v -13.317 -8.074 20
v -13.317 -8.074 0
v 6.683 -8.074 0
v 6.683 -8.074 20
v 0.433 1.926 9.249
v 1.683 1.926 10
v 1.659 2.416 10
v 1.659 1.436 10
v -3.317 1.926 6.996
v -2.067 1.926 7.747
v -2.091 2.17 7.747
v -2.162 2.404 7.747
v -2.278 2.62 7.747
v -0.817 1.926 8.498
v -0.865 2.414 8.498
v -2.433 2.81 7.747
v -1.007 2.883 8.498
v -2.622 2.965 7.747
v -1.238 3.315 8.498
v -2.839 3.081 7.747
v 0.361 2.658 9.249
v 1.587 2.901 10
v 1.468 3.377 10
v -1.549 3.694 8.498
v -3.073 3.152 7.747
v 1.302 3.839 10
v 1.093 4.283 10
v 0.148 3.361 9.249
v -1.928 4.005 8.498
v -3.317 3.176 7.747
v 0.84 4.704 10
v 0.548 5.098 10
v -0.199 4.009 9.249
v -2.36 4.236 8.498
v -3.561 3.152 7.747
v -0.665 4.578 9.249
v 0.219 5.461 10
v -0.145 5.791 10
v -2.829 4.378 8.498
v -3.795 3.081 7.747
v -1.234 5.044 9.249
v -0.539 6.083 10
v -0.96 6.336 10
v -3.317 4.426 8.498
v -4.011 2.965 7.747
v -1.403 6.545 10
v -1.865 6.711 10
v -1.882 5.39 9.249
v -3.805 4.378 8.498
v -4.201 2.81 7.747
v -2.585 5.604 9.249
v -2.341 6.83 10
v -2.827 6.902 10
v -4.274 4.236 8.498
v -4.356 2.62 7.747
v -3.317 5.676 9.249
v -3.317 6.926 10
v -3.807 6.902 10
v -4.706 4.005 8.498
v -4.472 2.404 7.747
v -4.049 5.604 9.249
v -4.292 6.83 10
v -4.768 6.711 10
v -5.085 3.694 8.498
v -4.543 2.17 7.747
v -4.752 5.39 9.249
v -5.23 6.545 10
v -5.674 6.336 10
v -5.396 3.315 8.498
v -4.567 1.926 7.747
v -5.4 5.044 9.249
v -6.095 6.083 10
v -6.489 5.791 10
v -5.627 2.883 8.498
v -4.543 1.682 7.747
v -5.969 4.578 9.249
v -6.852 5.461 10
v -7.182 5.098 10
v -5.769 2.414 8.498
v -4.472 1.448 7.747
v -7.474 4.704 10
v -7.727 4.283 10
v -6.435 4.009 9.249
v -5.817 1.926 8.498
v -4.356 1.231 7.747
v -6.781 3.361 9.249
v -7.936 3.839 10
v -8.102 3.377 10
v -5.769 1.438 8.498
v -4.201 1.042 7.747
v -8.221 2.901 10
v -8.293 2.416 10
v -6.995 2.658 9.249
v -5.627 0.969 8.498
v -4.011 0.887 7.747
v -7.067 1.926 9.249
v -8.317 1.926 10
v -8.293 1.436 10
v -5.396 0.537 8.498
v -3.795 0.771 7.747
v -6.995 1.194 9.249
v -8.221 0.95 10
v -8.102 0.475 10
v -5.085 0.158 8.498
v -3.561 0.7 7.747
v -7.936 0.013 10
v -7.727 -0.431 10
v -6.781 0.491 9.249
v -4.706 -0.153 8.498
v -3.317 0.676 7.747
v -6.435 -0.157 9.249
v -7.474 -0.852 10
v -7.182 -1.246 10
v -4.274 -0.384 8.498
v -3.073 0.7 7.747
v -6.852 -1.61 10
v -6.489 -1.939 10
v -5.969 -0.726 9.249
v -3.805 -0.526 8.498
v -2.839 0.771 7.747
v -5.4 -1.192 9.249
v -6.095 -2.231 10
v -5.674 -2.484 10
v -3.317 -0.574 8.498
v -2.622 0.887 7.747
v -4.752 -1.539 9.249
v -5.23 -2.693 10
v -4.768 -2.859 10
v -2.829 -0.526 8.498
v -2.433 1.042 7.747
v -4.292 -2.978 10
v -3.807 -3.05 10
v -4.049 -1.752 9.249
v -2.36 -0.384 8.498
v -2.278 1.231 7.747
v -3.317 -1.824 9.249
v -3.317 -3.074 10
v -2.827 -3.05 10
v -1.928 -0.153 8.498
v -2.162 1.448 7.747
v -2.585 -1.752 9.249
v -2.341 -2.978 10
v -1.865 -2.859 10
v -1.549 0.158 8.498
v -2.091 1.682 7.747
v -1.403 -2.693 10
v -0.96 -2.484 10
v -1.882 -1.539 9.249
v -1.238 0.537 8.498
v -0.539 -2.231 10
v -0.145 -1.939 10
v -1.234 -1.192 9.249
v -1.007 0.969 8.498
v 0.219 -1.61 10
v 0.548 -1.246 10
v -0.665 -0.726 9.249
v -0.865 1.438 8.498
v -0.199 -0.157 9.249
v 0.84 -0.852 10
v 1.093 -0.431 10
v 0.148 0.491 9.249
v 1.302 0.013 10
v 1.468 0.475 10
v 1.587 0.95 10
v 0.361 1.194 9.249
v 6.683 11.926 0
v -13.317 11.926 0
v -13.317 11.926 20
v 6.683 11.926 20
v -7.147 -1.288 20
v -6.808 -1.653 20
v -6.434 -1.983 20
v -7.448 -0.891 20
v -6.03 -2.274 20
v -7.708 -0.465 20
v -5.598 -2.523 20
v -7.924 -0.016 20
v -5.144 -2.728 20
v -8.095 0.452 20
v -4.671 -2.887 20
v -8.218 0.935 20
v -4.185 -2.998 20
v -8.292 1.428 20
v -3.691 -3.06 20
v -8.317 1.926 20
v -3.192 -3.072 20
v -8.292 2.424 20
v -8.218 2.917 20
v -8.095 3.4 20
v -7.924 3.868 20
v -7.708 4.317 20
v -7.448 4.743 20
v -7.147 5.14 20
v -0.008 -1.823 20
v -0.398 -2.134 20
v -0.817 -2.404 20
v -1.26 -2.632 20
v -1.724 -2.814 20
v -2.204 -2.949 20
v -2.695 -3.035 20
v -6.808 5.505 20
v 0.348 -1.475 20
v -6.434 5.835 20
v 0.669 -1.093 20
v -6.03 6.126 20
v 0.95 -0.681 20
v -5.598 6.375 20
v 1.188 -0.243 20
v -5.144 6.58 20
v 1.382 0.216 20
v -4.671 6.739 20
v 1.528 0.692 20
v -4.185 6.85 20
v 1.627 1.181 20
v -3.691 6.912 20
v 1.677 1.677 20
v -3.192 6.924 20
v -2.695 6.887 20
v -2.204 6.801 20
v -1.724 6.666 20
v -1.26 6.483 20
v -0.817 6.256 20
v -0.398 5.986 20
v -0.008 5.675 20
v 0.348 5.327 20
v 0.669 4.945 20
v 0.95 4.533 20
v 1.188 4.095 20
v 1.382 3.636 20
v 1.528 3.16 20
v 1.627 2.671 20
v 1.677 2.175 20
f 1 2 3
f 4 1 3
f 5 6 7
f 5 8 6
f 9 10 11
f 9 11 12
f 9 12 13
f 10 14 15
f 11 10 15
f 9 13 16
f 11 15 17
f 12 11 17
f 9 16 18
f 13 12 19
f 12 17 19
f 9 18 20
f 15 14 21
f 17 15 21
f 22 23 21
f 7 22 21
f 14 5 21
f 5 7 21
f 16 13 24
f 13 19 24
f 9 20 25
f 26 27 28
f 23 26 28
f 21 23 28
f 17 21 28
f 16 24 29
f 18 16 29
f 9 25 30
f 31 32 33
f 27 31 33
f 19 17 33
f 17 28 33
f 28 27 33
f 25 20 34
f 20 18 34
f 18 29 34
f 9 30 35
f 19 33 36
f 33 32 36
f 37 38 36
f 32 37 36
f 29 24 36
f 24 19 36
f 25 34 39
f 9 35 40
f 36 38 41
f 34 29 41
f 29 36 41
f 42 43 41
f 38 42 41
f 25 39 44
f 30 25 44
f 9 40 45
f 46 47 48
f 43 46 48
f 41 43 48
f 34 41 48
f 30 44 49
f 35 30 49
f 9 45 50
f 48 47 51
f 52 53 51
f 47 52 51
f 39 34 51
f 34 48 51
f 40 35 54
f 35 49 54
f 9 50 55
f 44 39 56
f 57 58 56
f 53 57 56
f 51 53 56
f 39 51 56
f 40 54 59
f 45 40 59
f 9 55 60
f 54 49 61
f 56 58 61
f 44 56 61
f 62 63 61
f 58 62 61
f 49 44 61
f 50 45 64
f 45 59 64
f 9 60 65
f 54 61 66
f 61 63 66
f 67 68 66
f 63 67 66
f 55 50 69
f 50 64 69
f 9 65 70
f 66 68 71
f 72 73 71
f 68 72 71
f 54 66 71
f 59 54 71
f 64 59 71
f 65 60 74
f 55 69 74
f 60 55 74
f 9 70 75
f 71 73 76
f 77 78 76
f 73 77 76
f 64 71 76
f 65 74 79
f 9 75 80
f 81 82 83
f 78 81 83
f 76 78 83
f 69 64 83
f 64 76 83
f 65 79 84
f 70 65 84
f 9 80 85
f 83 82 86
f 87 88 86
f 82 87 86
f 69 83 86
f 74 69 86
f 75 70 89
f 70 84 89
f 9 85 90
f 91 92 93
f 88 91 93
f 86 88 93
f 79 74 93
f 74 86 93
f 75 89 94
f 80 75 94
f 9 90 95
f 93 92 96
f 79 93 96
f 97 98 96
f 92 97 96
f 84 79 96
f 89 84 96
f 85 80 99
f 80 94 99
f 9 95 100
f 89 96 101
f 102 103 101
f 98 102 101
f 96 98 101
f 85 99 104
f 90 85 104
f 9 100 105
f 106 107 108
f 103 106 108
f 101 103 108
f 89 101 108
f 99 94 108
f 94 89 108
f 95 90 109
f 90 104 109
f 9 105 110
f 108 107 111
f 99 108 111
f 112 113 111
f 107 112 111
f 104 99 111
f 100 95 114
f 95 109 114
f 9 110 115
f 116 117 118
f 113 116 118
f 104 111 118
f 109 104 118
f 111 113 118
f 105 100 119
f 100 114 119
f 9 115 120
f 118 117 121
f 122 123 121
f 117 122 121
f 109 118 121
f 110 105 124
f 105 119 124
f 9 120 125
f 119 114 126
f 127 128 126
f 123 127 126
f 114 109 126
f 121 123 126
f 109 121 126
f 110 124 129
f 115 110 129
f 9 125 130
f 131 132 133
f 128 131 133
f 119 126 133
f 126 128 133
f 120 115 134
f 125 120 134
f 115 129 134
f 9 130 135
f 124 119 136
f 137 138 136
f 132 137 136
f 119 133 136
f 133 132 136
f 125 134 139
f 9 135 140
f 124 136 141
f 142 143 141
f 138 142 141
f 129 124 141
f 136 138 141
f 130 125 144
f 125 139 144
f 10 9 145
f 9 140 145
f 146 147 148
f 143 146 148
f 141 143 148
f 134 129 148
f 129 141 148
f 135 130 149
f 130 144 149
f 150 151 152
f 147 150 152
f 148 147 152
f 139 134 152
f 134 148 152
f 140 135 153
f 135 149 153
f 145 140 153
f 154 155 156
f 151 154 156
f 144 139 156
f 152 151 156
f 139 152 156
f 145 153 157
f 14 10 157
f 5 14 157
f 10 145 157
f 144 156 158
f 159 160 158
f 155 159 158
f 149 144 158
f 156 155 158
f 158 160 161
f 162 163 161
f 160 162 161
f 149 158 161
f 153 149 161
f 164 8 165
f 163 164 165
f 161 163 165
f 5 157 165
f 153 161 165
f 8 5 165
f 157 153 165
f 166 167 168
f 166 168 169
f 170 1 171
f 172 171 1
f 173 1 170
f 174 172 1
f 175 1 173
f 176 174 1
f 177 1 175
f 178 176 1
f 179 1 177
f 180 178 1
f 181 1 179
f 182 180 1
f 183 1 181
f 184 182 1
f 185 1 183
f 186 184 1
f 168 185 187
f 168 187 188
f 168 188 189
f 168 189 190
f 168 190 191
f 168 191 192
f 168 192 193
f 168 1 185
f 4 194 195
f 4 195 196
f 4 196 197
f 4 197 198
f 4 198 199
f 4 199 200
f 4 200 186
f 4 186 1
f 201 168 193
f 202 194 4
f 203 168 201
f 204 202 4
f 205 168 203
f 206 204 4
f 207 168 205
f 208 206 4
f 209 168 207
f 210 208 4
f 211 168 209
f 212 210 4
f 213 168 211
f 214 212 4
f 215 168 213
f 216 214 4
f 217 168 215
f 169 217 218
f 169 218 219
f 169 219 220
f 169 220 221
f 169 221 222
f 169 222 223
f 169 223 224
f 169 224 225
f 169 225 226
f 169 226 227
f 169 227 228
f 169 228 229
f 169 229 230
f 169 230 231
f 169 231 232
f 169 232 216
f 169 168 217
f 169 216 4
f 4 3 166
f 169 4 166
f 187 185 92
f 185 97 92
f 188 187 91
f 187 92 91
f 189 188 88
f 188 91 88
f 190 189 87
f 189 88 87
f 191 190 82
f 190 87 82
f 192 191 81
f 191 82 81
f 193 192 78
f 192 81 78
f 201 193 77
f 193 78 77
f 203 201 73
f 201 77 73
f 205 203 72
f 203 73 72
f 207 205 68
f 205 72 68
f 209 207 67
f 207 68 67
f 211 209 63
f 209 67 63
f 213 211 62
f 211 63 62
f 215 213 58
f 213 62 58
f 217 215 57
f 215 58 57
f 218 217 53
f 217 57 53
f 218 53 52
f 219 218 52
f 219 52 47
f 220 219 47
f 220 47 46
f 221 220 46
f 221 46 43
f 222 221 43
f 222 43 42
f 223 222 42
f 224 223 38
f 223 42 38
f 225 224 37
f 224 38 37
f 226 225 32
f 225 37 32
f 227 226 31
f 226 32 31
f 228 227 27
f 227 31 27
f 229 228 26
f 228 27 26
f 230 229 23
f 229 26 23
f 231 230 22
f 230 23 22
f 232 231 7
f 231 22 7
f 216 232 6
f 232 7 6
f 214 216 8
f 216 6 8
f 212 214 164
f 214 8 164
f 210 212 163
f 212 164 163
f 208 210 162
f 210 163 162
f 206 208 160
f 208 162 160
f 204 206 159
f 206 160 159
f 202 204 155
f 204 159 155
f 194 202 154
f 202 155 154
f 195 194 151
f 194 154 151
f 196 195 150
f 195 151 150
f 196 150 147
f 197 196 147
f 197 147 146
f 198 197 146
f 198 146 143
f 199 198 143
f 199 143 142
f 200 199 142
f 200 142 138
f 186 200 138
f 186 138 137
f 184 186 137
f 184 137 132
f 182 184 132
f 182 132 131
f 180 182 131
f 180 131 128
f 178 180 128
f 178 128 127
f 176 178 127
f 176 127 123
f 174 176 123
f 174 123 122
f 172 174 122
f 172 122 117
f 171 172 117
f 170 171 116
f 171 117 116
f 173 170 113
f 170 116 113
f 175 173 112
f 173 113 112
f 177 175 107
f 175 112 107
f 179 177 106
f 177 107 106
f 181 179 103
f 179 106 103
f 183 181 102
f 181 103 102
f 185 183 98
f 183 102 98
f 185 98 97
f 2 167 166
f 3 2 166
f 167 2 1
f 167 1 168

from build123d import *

# Parameters (mm, degrees)
F0_W     = 20
F0_H     = 20
F1_DEPTH = 20
F3_D     = 10
F3_DEPTH = 10
F3_TIP   = 3.0043030951


with BuildPart() as f1:
    # F0 (on Top) → F1 (new body)
    with BuildSketch(Plane.XY):
        with Locations((-3.3169160597, 1.9259513356)):
            Rectangle(F0_W, F0_H)
    extrude(amount=F1_DEPTH)

    # F3
    with Locations(Plane.XY.offset(20)):
        with Locations((-3.3169160597, 1.9259513356)):
            Hole(F3_D / 2, depth=F3_DEPTH)
            with Locations((0, 0, -(F3_DEPTH + F3_TIP / 2))):  # 118° drill point
                Cone(0, F3_D / 2, F3_TIP, mode=Mode.SUBTRACT)


solid = f1.part
